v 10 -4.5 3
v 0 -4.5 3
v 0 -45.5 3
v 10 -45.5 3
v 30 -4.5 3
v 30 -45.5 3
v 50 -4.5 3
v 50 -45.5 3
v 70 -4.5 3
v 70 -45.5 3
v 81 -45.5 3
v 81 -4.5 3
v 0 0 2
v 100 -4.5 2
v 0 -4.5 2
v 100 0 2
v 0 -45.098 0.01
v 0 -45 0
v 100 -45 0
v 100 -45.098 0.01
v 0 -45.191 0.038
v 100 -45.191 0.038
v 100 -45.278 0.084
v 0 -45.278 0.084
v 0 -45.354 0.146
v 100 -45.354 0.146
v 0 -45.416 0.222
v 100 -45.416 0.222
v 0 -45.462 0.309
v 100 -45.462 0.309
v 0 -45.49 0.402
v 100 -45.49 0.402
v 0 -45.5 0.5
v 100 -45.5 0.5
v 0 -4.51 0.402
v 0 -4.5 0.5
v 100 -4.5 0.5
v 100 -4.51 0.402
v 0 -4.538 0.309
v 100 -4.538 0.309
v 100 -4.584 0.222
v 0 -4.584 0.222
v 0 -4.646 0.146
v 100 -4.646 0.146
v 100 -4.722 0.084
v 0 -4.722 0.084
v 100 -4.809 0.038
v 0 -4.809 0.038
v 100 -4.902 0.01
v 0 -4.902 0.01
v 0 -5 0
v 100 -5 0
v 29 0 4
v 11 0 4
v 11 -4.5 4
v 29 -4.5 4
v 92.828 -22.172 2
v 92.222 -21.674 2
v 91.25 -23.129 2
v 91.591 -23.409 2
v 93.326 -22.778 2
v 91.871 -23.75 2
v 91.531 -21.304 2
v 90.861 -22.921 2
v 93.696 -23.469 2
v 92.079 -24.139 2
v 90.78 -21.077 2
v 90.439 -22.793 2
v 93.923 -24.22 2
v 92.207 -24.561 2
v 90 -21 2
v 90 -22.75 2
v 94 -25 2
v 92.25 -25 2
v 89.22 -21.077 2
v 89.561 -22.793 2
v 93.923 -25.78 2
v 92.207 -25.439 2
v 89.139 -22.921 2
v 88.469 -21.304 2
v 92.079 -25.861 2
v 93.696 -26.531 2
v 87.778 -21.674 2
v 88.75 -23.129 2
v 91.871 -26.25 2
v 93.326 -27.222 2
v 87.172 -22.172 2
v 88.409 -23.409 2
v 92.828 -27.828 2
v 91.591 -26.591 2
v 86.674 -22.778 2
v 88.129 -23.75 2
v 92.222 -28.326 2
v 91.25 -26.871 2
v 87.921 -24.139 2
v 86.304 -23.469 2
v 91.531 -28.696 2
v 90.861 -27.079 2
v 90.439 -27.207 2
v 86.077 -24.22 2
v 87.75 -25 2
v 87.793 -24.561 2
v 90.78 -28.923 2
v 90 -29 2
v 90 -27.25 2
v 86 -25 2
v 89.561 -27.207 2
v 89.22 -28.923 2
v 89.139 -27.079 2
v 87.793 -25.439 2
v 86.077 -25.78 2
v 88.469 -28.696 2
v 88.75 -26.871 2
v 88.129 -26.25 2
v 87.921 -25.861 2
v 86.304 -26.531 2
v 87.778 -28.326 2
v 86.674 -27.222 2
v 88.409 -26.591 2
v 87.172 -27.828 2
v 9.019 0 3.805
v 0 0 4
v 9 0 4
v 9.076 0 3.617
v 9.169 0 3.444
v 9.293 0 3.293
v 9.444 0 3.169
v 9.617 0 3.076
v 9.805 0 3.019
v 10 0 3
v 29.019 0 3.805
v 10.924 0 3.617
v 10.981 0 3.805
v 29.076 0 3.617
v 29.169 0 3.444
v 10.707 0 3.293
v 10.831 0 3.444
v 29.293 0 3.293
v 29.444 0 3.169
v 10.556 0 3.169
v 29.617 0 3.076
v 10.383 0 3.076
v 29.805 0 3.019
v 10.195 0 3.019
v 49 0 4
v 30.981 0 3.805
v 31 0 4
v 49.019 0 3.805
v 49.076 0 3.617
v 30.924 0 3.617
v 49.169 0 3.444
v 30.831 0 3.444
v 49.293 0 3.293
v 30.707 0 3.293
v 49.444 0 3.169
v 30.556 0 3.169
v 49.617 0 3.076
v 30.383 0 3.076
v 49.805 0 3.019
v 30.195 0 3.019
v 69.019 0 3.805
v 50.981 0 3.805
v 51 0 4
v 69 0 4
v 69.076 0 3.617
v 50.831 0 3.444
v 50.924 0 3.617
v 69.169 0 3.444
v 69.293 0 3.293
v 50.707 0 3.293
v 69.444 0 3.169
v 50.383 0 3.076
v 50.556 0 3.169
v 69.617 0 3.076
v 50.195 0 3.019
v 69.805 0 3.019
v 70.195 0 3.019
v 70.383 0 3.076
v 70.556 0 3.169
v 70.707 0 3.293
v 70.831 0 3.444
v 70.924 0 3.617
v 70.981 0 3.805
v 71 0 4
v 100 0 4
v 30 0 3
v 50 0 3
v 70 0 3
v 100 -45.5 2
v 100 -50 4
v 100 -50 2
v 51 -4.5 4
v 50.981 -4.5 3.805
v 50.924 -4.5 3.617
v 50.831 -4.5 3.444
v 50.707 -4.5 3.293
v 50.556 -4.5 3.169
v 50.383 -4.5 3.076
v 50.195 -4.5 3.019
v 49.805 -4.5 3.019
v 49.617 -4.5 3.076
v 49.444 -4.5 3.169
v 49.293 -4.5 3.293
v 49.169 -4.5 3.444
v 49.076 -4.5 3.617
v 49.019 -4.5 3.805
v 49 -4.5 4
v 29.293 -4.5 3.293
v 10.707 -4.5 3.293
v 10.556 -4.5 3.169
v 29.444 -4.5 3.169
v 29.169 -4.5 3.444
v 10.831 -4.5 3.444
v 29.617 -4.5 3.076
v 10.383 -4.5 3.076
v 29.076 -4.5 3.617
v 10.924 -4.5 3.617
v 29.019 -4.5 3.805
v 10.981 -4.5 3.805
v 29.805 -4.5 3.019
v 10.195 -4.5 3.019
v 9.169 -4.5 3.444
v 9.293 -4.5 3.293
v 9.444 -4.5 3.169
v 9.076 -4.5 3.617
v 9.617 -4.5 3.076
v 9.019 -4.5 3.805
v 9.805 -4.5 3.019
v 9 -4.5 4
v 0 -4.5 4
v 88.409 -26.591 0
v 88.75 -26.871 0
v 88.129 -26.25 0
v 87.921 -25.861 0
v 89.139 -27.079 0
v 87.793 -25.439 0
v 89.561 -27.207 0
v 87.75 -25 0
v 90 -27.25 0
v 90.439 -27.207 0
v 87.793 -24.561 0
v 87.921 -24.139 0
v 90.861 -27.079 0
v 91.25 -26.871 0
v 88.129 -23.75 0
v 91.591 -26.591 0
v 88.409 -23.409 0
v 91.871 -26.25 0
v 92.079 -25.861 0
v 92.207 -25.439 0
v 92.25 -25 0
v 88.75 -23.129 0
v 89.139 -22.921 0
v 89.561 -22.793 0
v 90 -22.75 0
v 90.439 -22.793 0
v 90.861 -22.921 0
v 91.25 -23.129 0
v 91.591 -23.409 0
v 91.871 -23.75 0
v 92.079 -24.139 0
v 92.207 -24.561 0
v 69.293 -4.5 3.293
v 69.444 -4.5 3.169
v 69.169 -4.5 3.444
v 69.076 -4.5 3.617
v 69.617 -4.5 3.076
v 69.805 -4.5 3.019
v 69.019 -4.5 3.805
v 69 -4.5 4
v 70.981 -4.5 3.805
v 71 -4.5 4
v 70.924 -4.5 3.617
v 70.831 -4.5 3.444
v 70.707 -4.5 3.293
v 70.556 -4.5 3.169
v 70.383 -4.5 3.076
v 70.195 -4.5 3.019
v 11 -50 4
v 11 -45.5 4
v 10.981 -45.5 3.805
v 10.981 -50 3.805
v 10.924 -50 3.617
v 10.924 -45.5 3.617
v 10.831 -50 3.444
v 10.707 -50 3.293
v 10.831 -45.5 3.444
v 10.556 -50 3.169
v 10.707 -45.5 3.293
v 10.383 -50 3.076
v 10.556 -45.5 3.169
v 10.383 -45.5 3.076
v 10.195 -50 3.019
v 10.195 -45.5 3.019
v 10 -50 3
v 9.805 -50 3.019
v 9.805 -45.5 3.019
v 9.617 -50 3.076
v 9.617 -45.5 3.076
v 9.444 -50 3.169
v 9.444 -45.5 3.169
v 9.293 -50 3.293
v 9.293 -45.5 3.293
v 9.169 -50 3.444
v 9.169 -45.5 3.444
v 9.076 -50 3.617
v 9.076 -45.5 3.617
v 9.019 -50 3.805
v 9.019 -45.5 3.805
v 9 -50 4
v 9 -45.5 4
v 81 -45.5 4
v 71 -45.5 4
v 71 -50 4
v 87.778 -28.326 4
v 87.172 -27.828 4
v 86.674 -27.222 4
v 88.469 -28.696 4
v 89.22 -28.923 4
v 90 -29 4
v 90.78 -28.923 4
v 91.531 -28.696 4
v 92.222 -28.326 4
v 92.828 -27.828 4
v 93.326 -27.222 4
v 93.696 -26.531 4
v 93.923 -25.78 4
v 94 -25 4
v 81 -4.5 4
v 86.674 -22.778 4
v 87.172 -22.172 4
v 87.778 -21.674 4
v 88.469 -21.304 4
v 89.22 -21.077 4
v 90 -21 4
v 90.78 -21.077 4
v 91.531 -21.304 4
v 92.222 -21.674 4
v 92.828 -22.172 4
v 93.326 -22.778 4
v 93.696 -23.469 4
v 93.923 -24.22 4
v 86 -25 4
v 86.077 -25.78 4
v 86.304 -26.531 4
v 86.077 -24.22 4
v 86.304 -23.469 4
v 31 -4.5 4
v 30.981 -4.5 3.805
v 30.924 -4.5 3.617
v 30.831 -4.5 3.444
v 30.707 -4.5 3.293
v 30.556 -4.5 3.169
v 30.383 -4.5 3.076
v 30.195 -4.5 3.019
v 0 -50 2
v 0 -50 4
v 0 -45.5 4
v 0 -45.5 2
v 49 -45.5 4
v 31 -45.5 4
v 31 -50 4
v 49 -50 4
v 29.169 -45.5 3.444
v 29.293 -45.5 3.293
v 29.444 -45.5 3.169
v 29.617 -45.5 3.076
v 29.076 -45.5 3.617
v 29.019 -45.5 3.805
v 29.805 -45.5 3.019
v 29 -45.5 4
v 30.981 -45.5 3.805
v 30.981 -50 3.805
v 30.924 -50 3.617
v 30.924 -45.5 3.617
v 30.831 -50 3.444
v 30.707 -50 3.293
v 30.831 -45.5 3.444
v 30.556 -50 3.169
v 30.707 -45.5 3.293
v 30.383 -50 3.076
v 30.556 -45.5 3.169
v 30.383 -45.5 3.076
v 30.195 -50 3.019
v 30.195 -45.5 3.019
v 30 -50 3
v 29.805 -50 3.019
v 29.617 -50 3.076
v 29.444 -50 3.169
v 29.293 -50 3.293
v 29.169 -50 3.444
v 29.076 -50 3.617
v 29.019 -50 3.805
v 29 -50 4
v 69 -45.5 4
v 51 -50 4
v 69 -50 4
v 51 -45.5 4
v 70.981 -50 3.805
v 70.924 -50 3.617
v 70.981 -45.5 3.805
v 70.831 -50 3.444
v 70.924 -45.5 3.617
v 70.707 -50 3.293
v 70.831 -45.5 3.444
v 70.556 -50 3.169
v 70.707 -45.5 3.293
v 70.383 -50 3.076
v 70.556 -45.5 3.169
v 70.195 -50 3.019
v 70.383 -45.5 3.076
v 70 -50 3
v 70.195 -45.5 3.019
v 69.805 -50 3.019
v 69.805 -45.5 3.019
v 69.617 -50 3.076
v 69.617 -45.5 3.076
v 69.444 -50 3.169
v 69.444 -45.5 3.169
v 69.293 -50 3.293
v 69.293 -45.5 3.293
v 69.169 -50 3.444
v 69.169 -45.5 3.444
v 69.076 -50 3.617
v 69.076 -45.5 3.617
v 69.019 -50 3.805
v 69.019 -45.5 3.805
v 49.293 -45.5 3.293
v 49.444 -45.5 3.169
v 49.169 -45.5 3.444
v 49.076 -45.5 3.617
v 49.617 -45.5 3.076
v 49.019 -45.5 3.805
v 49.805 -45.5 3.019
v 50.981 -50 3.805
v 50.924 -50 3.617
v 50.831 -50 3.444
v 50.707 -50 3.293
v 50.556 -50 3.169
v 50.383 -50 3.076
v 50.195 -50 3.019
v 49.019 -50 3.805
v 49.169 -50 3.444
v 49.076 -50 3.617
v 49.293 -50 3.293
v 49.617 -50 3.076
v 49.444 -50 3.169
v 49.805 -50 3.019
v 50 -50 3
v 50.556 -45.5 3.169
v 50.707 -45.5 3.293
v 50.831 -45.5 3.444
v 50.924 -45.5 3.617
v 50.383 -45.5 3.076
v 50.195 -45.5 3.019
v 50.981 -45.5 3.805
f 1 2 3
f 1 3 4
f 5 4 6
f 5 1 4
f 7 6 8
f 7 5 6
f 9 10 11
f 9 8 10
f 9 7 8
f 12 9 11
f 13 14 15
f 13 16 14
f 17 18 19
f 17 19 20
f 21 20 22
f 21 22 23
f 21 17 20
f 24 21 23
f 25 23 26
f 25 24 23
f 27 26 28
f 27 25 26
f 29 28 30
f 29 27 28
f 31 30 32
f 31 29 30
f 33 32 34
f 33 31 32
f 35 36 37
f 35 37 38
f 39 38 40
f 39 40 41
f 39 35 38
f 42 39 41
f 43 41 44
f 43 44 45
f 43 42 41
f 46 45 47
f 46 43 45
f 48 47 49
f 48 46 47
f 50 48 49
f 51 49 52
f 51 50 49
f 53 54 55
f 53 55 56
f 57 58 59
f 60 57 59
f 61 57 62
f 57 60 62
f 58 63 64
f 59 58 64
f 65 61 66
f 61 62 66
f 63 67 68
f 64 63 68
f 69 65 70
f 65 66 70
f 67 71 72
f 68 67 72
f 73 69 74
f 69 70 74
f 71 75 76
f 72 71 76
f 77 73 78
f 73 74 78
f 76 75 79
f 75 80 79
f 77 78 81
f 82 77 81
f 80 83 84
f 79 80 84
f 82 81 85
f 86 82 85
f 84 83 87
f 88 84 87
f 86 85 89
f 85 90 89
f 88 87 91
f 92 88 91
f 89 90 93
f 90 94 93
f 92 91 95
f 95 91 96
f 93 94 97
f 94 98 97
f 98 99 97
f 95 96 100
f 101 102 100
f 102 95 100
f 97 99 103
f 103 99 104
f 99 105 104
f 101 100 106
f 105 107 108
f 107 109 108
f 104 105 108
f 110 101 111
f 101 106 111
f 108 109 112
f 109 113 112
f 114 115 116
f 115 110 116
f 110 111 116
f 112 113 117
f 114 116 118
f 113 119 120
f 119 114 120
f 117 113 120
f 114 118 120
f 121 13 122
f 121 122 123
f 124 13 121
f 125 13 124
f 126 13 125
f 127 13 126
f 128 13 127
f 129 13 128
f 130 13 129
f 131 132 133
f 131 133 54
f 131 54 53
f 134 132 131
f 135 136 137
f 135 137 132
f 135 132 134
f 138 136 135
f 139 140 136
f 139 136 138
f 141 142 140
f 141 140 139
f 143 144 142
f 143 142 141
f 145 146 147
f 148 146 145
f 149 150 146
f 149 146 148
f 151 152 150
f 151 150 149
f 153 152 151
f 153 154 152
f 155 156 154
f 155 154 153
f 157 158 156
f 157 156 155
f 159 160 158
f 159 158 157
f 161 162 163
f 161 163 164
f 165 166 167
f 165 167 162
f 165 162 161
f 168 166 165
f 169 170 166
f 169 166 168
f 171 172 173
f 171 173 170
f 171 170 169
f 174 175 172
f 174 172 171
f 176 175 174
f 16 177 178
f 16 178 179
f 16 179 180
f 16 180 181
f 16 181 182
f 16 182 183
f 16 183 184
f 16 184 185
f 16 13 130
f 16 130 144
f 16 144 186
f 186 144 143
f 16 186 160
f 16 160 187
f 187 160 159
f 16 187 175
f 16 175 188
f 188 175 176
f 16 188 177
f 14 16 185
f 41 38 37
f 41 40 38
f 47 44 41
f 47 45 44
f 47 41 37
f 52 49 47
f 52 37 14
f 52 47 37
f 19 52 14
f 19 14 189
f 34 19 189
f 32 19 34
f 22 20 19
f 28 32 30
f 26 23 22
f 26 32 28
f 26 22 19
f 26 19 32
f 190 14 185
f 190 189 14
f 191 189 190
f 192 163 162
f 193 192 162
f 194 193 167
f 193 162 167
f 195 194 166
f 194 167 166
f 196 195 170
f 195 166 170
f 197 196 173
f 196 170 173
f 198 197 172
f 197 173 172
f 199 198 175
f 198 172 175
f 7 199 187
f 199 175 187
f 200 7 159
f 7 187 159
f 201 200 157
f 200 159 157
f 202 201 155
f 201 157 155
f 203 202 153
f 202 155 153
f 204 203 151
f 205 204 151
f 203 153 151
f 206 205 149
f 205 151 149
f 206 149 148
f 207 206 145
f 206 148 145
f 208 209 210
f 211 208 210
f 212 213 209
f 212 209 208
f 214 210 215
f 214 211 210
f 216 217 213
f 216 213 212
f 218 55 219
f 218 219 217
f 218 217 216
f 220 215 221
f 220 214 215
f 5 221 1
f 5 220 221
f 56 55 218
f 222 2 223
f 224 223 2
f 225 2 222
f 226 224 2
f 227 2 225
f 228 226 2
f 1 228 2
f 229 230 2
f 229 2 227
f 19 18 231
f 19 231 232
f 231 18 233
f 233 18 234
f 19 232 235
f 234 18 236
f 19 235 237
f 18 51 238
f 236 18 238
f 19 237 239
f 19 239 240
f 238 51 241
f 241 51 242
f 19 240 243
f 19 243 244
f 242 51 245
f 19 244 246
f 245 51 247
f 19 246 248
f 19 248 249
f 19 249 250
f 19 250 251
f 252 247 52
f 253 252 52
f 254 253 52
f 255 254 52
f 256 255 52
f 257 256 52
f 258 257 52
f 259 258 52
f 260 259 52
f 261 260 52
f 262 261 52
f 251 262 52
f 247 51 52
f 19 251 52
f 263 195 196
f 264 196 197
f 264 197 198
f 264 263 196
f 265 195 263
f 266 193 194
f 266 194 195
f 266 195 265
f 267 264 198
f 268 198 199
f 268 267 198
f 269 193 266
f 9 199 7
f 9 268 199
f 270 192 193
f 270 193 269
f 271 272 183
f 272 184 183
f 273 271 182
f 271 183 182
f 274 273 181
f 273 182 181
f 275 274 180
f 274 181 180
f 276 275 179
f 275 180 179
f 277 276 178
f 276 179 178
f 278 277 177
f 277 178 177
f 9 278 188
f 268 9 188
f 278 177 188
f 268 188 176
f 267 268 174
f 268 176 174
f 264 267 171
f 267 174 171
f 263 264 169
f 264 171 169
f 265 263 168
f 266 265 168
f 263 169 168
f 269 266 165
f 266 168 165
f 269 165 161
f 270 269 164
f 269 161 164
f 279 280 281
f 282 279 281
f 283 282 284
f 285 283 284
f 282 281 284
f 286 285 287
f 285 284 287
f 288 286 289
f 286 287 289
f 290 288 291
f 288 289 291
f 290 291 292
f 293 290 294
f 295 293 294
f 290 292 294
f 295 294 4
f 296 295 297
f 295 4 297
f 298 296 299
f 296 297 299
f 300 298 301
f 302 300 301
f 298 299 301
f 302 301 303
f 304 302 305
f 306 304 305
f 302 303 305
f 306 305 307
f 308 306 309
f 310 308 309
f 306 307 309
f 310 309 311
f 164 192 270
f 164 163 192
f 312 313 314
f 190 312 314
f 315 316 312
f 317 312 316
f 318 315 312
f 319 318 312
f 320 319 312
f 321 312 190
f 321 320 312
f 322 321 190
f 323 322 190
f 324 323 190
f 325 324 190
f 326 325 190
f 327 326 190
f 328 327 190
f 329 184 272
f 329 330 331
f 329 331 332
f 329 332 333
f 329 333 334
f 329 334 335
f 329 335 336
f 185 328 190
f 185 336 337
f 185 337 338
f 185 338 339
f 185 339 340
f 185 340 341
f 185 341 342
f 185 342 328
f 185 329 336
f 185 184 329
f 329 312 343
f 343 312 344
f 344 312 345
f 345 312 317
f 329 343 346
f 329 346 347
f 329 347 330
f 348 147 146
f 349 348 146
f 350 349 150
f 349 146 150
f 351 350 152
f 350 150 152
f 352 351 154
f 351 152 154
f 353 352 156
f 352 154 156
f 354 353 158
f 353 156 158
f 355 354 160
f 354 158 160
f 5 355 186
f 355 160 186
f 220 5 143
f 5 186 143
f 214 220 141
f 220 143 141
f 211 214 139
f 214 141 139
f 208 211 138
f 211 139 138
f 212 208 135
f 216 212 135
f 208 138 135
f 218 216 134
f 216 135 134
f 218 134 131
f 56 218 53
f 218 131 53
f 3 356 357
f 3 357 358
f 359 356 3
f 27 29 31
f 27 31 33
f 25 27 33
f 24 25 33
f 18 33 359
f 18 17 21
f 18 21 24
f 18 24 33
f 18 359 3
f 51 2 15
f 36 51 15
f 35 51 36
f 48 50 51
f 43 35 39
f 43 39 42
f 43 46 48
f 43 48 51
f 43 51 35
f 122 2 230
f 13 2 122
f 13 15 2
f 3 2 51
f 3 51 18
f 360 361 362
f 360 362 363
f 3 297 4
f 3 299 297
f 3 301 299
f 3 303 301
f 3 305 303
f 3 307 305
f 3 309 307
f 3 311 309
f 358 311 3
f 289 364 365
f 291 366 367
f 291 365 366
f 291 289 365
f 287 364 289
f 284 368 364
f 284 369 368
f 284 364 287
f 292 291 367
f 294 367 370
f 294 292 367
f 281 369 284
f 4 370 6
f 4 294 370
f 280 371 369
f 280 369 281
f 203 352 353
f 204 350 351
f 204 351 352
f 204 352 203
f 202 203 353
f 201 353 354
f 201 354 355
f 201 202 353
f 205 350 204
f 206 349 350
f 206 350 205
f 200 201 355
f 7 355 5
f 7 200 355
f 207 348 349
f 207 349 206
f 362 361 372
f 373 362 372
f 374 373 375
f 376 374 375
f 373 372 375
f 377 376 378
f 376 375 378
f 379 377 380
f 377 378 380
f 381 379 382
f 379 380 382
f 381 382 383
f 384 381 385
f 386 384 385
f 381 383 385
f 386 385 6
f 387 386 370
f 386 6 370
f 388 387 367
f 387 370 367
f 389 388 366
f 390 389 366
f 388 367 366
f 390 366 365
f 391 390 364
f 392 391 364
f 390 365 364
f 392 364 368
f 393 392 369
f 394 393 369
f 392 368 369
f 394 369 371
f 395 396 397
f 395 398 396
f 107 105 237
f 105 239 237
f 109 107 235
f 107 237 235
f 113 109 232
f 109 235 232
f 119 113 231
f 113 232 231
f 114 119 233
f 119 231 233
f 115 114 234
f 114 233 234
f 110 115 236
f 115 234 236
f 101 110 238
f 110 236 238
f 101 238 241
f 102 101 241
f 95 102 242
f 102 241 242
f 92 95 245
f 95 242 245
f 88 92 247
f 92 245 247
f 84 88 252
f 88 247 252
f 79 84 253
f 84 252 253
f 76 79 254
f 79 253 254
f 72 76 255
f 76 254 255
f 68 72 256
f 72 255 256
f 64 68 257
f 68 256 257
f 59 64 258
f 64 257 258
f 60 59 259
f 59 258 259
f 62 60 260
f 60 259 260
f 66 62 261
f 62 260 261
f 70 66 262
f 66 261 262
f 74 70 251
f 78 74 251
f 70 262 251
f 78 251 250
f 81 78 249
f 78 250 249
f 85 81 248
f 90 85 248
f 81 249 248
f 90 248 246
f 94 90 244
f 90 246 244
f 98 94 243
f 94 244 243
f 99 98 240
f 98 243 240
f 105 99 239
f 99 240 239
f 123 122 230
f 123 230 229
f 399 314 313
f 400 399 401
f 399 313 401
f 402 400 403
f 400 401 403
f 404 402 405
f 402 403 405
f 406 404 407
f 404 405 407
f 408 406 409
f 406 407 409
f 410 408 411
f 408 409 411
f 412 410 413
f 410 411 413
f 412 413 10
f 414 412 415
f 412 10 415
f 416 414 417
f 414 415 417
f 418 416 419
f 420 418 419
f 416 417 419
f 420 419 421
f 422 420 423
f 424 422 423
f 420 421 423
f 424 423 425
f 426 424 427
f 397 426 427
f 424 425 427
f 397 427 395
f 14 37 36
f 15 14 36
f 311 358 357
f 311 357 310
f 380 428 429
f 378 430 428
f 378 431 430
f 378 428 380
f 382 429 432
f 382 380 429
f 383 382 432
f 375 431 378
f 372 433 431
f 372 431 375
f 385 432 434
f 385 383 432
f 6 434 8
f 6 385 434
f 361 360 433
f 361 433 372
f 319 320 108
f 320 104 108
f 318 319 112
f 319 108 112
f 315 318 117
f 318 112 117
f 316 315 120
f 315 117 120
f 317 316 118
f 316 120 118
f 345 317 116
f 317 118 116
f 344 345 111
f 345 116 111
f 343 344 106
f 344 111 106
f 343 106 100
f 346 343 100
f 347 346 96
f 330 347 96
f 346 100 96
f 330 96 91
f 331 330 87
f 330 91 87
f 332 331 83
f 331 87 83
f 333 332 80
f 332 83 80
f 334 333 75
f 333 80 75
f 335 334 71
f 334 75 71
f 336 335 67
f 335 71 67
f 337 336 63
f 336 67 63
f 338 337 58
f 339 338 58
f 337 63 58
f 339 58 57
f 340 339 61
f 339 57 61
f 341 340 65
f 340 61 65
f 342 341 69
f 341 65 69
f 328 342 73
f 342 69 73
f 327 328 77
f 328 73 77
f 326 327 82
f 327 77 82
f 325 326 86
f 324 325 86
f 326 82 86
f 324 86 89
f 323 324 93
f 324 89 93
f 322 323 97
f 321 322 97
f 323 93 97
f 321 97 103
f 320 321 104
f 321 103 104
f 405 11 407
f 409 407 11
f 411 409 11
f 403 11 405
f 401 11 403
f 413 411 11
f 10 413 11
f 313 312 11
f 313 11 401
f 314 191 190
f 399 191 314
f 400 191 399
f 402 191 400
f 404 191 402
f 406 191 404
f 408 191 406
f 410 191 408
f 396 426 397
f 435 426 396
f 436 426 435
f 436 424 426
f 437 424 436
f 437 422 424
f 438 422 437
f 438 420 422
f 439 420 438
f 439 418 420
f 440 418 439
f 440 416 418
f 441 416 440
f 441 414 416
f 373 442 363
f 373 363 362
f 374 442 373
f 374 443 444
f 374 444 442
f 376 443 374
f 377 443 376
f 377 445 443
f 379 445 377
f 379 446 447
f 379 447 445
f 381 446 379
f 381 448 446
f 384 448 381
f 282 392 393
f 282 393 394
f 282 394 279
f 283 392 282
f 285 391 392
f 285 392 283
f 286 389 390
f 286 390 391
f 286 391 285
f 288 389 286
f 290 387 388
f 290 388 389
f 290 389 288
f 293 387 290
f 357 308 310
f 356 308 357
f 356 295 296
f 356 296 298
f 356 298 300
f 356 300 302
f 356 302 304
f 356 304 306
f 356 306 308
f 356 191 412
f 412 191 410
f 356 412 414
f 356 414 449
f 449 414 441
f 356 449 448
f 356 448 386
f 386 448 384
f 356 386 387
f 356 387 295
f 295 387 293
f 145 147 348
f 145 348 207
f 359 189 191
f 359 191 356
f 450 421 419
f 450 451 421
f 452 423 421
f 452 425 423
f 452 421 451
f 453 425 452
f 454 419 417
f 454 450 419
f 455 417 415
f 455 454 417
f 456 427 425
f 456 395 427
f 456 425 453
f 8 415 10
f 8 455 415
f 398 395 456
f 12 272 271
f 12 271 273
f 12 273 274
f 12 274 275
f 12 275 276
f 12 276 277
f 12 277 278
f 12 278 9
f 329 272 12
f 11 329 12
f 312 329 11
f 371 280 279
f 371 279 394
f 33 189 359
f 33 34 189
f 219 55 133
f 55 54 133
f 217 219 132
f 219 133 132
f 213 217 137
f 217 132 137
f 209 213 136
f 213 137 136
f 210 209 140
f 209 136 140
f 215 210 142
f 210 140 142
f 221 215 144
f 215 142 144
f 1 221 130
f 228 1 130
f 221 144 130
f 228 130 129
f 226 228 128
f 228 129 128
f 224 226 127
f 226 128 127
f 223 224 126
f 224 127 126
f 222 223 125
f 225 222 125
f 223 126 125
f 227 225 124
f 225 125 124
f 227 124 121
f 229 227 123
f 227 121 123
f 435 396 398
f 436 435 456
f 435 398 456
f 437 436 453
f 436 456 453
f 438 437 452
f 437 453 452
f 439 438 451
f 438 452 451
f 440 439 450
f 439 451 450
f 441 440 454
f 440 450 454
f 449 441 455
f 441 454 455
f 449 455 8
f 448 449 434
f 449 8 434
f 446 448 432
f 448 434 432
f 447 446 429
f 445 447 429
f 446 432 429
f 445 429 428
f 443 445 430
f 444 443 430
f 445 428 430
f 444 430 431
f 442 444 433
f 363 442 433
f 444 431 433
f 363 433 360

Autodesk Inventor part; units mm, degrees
ref_plane "YZ Plane" through (0, 0, 0) normal (1, 0, 0) x (0, 1, 0)
ref_plane "XZ Plane" through (0, 0, 0) normal (0, 1, 0) x (-1, 0, 0)
ref_plane "XY Plane" through (0, 0, 0) normal (0, 0, 1) x (1, 0, 0)
sketch "Sketch1" plane through (0, 0, 0) normal (0, 0, 1) x (1, 0, 0)
  line L0 (0, 0) -> (100, 0)
  line L1 (100, 0) -> (100, -50)
  line L2 (100, -50) -> (0, -50)
  line L3 (0, -50) -> (0, 0)
  dimension "d2" = 100
  dimension "d3" = 50
extrude "Extrusion1" add sketch "Sketch1" along normal blind 4
sketch "Sketch2" plane through (0, 0, 0) normal (0, 0, -1) x (-1, 0, 0)
  line L0 (0, 0) -> (0, -50) projected
  line L1 (0, -50) -> (-100, -50)
  line L2 (-100, -50) -> (-100, -45.5)
  line L3 (-100, -45.5) -> (0, -45.5)
  line L4 (0, -45.5) -> (0, -50)
  line L5 (0, 0) -> (-100, 0)
  line L6 (-100, 0) -> (-100, -4.5)
  line L7 (-100, -4.5) -> (0, -4.5)
  line L8 (0, -4.5) -> (0, 0)
  line L9 (-100, -50) -> (-100, 0) projected
  dimension "d6" = 4.5
  dimension "d7" = 4.5
  dimension "d16" = 0
  dimension "d17" = 0
extrude "Extrusion2" cut sketch "Sketch2" against normal blind 2 contours L0 L7 L6 L5 | L0 L1 L2 L3
fillet "Fillet1" radius 0.5 2 edges at (50, -45.5, 0) (50, -4.5, 0)
sketch "Sketch3" plane through (0, 0, 4) normal (0, 0, 1) x (1, 0, 0)
  line L0 (0, -45) -> (0, -5) projected
  line L1 (0, -4.5) -> (81, -4.5)
  line L2 (81, -4.5) -> (81, -45.5)
  line L3 (81, -45.5) -> (0, -45.5)
  line L4 (0, -45.5) -> (0, -4.5)
  line L5 (100, 0) -> (0, 0) projected
  dimension "d11" = 81
  dimension "d12" = 41
  dimension "d13" = 4.5
extrude "Extrusion3" cut sketch "Sketch3" against normal blind 1
sketch "Sketch5" plane through (0, 0, 4) normal (0, 0, 1) x (1, 0, 0)
  line L0 (100, 0) -> (0, 0) projected
  line L1 (100, -50) -> (100, 0) projected
  point P0 (90, -25)
  dimension "d37" = 25
  dimension "d38" = 10
hole "Hole1" at (90, -25, 4) direction (0, 0, -1) diameter 4.5 end through all counterbore diameter 8 counterbore depth 2
hole "Hole2" at (10, -50, 4) direction (0, 1, 0) diameter 2 end through all
pattern_linear "Rectangular Pattern1" count 4 spacing 20 along (1, 0, 0) of "Hole2"
properties part number "TNS_Greiferbacke_MA_Jun_T2"
